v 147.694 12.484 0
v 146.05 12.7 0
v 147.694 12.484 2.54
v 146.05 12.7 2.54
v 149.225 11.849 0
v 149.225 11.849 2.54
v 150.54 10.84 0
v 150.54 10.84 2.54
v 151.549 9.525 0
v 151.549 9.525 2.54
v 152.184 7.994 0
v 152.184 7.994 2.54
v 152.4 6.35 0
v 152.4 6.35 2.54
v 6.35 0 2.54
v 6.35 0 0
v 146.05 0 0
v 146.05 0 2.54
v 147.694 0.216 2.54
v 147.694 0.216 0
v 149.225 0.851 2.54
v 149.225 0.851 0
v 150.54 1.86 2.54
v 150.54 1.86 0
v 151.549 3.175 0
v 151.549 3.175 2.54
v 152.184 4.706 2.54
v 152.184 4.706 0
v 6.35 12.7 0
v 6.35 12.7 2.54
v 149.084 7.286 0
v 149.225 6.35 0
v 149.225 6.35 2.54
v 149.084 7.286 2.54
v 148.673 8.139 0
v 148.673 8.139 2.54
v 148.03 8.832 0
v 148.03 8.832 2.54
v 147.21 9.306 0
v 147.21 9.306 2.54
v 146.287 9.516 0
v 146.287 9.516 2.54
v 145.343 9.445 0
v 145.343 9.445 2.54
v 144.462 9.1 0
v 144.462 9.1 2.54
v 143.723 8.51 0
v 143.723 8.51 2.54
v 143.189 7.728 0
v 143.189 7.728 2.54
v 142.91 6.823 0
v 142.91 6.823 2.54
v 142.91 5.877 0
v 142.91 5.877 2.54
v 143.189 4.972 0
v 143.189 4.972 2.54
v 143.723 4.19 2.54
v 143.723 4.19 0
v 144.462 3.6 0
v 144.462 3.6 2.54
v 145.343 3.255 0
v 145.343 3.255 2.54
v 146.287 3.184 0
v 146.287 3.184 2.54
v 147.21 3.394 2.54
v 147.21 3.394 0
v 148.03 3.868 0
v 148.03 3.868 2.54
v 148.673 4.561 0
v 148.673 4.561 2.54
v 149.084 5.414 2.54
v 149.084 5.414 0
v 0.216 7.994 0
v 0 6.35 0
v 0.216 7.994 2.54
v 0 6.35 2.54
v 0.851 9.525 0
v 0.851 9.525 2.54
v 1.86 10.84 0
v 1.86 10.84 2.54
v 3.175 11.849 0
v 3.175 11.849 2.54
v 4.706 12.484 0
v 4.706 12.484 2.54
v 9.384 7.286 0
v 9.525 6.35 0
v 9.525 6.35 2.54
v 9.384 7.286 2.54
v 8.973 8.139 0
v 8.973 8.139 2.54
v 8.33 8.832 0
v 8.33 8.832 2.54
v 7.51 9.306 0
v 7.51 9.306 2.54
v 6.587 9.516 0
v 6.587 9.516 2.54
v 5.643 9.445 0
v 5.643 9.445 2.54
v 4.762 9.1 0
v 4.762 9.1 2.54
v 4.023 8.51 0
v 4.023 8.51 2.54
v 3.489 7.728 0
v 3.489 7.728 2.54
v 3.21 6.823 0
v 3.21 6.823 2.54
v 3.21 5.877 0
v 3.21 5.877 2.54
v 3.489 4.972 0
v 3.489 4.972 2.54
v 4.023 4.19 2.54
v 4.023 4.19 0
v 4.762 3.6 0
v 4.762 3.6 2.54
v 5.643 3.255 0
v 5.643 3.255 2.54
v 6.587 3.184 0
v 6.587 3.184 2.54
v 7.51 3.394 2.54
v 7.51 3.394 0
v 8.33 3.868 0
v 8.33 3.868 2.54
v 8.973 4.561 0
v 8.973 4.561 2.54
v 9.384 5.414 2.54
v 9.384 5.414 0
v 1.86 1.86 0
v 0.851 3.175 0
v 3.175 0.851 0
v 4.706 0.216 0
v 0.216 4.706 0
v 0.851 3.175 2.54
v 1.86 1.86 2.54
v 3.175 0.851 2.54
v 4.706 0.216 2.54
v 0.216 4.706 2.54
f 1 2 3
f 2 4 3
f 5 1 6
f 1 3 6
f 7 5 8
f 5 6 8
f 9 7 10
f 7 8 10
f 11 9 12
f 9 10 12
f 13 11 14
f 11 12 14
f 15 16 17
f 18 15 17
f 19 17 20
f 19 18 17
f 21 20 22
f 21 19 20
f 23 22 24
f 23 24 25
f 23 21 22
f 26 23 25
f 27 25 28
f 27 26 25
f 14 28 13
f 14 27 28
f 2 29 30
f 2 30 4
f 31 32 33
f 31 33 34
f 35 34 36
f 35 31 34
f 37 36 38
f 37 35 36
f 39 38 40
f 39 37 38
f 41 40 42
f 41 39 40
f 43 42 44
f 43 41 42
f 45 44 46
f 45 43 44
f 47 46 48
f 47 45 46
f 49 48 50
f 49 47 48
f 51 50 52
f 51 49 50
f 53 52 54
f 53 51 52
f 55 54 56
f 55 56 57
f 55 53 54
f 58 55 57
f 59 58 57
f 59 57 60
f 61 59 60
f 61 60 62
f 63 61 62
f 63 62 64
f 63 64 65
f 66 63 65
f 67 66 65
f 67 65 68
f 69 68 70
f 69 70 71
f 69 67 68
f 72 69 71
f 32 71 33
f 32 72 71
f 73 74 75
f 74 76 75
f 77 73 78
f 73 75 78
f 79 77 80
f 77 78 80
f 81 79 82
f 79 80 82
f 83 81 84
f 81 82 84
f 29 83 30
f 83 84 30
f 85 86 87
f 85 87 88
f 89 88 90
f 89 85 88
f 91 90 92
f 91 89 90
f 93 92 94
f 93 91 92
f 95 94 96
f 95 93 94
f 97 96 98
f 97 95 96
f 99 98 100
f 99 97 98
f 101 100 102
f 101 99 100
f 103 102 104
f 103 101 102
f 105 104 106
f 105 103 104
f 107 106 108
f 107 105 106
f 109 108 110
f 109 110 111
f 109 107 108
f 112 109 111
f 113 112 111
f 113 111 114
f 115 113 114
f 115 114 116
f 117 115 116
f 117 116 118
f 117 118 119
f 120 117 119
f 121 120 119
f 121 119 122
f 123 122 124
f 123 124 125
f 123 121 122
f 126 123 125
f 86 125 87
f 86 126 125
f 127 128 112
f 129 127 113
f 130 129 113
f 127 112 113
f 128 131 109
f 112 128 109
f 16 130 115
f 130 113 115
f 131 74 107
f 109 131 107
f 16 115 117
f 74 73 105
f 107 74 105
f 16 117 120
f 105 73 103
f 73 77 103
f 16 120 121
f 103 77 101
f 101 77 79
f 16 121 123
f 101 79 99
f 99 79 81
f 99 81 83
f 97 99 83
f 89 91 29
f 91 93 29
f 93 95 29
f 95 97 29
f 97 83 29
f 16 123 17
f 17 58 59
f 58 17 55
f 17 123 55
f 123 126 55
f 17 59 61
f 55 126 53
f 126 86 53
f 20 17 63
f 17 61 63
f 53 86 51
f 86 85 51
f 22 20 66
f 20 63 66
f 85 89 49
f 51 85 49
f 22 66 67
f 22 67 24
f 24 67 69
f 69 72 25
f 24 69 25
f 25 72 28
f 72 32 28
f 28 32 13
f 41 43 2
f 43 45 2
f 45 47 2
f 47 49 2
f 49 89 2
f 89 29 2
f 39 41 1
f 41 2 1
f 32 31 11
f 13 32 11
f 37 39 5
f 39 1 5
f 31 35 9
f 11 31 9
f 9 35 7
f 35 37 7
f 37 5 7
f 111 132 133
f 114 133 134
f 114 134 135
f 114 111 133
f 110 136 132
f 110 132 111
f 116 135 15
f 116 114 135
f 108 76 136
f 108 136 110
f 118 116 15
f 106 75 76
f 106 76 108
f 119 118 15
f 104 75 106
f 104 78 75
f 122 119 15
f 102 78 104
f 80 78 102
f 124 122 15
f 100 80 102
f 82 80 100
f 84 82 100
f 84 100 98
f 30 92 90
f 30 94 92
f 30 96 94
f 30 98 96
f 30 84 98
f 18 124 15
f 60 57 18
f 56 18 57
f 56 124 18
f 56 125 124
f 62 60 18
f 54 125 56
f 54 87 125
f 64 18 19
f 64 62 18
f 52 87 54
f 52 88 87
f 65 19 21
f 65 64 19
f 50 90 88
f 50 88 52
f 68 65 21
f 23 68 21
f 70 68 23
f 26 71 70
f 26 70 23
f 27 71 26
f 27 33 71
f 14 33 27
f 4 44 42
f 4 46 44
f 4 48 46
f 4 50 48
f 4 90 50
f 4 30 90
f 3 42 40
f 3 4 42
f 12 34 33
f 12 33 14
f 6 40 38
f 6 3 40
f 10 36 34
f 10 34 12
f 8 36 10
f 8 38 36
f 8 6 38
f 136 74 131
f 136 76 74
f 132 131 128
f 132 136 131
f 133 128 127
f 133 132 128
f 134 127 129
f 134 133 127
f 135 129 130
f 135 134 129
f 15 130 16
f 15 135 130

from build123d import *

# Parameters (mm, degrees)
SKETCH1_W           = 152.4
SKETCH1_H           = 12.7
SKETCH1_R           = 3.175
BOSS_EXTRUDE1_DEPTH = 2.54
FILLET2_R           = 6.35
FILLET3_R           = 6.35


with BuildPart() as part:
    # Sketch1 → Boss-Extrude1 (new body)
    with BuildSketch(Plane.XY):
        with Locations((76.2, 6.35)):
            Rectangle(SKETCH1_W, SKETCH1_H)
        with Locations((6.35, 6.35)):
            Circle(SKETCH1_R, mode=Mode.SUBTRACT)
        with Locations((146.05, 6.35)):
            Circle(SKETCH1_R, mode=Mode.SUBTRACT)
    extrude(amount=BOSS_EXTRUDE1_DEPTH)

    # Fillet2
    fillet2_edges = [part.edges().sort_by_distance(p)[0] for p in [
        (0, 0, 1.27),
        (0, 12.7, 1.27),
    ]]
    fillet(fillet2_edges, radius=FILLET2_R - 0.0001)  # a hair under: the kernel refuses the full size

    # Fillet3
    fillet3_edges = [part.edges().sort_by_distance(p)[0] for p in [
        (152.4, 0, 1.27),
        (152.4, 12.7, 1.27),
    ]]
    fillet(fillet3_edges, radius=FILLET3_R - 0.0001)  # a hair under: the kernel refuses the full size


solid = part.part
